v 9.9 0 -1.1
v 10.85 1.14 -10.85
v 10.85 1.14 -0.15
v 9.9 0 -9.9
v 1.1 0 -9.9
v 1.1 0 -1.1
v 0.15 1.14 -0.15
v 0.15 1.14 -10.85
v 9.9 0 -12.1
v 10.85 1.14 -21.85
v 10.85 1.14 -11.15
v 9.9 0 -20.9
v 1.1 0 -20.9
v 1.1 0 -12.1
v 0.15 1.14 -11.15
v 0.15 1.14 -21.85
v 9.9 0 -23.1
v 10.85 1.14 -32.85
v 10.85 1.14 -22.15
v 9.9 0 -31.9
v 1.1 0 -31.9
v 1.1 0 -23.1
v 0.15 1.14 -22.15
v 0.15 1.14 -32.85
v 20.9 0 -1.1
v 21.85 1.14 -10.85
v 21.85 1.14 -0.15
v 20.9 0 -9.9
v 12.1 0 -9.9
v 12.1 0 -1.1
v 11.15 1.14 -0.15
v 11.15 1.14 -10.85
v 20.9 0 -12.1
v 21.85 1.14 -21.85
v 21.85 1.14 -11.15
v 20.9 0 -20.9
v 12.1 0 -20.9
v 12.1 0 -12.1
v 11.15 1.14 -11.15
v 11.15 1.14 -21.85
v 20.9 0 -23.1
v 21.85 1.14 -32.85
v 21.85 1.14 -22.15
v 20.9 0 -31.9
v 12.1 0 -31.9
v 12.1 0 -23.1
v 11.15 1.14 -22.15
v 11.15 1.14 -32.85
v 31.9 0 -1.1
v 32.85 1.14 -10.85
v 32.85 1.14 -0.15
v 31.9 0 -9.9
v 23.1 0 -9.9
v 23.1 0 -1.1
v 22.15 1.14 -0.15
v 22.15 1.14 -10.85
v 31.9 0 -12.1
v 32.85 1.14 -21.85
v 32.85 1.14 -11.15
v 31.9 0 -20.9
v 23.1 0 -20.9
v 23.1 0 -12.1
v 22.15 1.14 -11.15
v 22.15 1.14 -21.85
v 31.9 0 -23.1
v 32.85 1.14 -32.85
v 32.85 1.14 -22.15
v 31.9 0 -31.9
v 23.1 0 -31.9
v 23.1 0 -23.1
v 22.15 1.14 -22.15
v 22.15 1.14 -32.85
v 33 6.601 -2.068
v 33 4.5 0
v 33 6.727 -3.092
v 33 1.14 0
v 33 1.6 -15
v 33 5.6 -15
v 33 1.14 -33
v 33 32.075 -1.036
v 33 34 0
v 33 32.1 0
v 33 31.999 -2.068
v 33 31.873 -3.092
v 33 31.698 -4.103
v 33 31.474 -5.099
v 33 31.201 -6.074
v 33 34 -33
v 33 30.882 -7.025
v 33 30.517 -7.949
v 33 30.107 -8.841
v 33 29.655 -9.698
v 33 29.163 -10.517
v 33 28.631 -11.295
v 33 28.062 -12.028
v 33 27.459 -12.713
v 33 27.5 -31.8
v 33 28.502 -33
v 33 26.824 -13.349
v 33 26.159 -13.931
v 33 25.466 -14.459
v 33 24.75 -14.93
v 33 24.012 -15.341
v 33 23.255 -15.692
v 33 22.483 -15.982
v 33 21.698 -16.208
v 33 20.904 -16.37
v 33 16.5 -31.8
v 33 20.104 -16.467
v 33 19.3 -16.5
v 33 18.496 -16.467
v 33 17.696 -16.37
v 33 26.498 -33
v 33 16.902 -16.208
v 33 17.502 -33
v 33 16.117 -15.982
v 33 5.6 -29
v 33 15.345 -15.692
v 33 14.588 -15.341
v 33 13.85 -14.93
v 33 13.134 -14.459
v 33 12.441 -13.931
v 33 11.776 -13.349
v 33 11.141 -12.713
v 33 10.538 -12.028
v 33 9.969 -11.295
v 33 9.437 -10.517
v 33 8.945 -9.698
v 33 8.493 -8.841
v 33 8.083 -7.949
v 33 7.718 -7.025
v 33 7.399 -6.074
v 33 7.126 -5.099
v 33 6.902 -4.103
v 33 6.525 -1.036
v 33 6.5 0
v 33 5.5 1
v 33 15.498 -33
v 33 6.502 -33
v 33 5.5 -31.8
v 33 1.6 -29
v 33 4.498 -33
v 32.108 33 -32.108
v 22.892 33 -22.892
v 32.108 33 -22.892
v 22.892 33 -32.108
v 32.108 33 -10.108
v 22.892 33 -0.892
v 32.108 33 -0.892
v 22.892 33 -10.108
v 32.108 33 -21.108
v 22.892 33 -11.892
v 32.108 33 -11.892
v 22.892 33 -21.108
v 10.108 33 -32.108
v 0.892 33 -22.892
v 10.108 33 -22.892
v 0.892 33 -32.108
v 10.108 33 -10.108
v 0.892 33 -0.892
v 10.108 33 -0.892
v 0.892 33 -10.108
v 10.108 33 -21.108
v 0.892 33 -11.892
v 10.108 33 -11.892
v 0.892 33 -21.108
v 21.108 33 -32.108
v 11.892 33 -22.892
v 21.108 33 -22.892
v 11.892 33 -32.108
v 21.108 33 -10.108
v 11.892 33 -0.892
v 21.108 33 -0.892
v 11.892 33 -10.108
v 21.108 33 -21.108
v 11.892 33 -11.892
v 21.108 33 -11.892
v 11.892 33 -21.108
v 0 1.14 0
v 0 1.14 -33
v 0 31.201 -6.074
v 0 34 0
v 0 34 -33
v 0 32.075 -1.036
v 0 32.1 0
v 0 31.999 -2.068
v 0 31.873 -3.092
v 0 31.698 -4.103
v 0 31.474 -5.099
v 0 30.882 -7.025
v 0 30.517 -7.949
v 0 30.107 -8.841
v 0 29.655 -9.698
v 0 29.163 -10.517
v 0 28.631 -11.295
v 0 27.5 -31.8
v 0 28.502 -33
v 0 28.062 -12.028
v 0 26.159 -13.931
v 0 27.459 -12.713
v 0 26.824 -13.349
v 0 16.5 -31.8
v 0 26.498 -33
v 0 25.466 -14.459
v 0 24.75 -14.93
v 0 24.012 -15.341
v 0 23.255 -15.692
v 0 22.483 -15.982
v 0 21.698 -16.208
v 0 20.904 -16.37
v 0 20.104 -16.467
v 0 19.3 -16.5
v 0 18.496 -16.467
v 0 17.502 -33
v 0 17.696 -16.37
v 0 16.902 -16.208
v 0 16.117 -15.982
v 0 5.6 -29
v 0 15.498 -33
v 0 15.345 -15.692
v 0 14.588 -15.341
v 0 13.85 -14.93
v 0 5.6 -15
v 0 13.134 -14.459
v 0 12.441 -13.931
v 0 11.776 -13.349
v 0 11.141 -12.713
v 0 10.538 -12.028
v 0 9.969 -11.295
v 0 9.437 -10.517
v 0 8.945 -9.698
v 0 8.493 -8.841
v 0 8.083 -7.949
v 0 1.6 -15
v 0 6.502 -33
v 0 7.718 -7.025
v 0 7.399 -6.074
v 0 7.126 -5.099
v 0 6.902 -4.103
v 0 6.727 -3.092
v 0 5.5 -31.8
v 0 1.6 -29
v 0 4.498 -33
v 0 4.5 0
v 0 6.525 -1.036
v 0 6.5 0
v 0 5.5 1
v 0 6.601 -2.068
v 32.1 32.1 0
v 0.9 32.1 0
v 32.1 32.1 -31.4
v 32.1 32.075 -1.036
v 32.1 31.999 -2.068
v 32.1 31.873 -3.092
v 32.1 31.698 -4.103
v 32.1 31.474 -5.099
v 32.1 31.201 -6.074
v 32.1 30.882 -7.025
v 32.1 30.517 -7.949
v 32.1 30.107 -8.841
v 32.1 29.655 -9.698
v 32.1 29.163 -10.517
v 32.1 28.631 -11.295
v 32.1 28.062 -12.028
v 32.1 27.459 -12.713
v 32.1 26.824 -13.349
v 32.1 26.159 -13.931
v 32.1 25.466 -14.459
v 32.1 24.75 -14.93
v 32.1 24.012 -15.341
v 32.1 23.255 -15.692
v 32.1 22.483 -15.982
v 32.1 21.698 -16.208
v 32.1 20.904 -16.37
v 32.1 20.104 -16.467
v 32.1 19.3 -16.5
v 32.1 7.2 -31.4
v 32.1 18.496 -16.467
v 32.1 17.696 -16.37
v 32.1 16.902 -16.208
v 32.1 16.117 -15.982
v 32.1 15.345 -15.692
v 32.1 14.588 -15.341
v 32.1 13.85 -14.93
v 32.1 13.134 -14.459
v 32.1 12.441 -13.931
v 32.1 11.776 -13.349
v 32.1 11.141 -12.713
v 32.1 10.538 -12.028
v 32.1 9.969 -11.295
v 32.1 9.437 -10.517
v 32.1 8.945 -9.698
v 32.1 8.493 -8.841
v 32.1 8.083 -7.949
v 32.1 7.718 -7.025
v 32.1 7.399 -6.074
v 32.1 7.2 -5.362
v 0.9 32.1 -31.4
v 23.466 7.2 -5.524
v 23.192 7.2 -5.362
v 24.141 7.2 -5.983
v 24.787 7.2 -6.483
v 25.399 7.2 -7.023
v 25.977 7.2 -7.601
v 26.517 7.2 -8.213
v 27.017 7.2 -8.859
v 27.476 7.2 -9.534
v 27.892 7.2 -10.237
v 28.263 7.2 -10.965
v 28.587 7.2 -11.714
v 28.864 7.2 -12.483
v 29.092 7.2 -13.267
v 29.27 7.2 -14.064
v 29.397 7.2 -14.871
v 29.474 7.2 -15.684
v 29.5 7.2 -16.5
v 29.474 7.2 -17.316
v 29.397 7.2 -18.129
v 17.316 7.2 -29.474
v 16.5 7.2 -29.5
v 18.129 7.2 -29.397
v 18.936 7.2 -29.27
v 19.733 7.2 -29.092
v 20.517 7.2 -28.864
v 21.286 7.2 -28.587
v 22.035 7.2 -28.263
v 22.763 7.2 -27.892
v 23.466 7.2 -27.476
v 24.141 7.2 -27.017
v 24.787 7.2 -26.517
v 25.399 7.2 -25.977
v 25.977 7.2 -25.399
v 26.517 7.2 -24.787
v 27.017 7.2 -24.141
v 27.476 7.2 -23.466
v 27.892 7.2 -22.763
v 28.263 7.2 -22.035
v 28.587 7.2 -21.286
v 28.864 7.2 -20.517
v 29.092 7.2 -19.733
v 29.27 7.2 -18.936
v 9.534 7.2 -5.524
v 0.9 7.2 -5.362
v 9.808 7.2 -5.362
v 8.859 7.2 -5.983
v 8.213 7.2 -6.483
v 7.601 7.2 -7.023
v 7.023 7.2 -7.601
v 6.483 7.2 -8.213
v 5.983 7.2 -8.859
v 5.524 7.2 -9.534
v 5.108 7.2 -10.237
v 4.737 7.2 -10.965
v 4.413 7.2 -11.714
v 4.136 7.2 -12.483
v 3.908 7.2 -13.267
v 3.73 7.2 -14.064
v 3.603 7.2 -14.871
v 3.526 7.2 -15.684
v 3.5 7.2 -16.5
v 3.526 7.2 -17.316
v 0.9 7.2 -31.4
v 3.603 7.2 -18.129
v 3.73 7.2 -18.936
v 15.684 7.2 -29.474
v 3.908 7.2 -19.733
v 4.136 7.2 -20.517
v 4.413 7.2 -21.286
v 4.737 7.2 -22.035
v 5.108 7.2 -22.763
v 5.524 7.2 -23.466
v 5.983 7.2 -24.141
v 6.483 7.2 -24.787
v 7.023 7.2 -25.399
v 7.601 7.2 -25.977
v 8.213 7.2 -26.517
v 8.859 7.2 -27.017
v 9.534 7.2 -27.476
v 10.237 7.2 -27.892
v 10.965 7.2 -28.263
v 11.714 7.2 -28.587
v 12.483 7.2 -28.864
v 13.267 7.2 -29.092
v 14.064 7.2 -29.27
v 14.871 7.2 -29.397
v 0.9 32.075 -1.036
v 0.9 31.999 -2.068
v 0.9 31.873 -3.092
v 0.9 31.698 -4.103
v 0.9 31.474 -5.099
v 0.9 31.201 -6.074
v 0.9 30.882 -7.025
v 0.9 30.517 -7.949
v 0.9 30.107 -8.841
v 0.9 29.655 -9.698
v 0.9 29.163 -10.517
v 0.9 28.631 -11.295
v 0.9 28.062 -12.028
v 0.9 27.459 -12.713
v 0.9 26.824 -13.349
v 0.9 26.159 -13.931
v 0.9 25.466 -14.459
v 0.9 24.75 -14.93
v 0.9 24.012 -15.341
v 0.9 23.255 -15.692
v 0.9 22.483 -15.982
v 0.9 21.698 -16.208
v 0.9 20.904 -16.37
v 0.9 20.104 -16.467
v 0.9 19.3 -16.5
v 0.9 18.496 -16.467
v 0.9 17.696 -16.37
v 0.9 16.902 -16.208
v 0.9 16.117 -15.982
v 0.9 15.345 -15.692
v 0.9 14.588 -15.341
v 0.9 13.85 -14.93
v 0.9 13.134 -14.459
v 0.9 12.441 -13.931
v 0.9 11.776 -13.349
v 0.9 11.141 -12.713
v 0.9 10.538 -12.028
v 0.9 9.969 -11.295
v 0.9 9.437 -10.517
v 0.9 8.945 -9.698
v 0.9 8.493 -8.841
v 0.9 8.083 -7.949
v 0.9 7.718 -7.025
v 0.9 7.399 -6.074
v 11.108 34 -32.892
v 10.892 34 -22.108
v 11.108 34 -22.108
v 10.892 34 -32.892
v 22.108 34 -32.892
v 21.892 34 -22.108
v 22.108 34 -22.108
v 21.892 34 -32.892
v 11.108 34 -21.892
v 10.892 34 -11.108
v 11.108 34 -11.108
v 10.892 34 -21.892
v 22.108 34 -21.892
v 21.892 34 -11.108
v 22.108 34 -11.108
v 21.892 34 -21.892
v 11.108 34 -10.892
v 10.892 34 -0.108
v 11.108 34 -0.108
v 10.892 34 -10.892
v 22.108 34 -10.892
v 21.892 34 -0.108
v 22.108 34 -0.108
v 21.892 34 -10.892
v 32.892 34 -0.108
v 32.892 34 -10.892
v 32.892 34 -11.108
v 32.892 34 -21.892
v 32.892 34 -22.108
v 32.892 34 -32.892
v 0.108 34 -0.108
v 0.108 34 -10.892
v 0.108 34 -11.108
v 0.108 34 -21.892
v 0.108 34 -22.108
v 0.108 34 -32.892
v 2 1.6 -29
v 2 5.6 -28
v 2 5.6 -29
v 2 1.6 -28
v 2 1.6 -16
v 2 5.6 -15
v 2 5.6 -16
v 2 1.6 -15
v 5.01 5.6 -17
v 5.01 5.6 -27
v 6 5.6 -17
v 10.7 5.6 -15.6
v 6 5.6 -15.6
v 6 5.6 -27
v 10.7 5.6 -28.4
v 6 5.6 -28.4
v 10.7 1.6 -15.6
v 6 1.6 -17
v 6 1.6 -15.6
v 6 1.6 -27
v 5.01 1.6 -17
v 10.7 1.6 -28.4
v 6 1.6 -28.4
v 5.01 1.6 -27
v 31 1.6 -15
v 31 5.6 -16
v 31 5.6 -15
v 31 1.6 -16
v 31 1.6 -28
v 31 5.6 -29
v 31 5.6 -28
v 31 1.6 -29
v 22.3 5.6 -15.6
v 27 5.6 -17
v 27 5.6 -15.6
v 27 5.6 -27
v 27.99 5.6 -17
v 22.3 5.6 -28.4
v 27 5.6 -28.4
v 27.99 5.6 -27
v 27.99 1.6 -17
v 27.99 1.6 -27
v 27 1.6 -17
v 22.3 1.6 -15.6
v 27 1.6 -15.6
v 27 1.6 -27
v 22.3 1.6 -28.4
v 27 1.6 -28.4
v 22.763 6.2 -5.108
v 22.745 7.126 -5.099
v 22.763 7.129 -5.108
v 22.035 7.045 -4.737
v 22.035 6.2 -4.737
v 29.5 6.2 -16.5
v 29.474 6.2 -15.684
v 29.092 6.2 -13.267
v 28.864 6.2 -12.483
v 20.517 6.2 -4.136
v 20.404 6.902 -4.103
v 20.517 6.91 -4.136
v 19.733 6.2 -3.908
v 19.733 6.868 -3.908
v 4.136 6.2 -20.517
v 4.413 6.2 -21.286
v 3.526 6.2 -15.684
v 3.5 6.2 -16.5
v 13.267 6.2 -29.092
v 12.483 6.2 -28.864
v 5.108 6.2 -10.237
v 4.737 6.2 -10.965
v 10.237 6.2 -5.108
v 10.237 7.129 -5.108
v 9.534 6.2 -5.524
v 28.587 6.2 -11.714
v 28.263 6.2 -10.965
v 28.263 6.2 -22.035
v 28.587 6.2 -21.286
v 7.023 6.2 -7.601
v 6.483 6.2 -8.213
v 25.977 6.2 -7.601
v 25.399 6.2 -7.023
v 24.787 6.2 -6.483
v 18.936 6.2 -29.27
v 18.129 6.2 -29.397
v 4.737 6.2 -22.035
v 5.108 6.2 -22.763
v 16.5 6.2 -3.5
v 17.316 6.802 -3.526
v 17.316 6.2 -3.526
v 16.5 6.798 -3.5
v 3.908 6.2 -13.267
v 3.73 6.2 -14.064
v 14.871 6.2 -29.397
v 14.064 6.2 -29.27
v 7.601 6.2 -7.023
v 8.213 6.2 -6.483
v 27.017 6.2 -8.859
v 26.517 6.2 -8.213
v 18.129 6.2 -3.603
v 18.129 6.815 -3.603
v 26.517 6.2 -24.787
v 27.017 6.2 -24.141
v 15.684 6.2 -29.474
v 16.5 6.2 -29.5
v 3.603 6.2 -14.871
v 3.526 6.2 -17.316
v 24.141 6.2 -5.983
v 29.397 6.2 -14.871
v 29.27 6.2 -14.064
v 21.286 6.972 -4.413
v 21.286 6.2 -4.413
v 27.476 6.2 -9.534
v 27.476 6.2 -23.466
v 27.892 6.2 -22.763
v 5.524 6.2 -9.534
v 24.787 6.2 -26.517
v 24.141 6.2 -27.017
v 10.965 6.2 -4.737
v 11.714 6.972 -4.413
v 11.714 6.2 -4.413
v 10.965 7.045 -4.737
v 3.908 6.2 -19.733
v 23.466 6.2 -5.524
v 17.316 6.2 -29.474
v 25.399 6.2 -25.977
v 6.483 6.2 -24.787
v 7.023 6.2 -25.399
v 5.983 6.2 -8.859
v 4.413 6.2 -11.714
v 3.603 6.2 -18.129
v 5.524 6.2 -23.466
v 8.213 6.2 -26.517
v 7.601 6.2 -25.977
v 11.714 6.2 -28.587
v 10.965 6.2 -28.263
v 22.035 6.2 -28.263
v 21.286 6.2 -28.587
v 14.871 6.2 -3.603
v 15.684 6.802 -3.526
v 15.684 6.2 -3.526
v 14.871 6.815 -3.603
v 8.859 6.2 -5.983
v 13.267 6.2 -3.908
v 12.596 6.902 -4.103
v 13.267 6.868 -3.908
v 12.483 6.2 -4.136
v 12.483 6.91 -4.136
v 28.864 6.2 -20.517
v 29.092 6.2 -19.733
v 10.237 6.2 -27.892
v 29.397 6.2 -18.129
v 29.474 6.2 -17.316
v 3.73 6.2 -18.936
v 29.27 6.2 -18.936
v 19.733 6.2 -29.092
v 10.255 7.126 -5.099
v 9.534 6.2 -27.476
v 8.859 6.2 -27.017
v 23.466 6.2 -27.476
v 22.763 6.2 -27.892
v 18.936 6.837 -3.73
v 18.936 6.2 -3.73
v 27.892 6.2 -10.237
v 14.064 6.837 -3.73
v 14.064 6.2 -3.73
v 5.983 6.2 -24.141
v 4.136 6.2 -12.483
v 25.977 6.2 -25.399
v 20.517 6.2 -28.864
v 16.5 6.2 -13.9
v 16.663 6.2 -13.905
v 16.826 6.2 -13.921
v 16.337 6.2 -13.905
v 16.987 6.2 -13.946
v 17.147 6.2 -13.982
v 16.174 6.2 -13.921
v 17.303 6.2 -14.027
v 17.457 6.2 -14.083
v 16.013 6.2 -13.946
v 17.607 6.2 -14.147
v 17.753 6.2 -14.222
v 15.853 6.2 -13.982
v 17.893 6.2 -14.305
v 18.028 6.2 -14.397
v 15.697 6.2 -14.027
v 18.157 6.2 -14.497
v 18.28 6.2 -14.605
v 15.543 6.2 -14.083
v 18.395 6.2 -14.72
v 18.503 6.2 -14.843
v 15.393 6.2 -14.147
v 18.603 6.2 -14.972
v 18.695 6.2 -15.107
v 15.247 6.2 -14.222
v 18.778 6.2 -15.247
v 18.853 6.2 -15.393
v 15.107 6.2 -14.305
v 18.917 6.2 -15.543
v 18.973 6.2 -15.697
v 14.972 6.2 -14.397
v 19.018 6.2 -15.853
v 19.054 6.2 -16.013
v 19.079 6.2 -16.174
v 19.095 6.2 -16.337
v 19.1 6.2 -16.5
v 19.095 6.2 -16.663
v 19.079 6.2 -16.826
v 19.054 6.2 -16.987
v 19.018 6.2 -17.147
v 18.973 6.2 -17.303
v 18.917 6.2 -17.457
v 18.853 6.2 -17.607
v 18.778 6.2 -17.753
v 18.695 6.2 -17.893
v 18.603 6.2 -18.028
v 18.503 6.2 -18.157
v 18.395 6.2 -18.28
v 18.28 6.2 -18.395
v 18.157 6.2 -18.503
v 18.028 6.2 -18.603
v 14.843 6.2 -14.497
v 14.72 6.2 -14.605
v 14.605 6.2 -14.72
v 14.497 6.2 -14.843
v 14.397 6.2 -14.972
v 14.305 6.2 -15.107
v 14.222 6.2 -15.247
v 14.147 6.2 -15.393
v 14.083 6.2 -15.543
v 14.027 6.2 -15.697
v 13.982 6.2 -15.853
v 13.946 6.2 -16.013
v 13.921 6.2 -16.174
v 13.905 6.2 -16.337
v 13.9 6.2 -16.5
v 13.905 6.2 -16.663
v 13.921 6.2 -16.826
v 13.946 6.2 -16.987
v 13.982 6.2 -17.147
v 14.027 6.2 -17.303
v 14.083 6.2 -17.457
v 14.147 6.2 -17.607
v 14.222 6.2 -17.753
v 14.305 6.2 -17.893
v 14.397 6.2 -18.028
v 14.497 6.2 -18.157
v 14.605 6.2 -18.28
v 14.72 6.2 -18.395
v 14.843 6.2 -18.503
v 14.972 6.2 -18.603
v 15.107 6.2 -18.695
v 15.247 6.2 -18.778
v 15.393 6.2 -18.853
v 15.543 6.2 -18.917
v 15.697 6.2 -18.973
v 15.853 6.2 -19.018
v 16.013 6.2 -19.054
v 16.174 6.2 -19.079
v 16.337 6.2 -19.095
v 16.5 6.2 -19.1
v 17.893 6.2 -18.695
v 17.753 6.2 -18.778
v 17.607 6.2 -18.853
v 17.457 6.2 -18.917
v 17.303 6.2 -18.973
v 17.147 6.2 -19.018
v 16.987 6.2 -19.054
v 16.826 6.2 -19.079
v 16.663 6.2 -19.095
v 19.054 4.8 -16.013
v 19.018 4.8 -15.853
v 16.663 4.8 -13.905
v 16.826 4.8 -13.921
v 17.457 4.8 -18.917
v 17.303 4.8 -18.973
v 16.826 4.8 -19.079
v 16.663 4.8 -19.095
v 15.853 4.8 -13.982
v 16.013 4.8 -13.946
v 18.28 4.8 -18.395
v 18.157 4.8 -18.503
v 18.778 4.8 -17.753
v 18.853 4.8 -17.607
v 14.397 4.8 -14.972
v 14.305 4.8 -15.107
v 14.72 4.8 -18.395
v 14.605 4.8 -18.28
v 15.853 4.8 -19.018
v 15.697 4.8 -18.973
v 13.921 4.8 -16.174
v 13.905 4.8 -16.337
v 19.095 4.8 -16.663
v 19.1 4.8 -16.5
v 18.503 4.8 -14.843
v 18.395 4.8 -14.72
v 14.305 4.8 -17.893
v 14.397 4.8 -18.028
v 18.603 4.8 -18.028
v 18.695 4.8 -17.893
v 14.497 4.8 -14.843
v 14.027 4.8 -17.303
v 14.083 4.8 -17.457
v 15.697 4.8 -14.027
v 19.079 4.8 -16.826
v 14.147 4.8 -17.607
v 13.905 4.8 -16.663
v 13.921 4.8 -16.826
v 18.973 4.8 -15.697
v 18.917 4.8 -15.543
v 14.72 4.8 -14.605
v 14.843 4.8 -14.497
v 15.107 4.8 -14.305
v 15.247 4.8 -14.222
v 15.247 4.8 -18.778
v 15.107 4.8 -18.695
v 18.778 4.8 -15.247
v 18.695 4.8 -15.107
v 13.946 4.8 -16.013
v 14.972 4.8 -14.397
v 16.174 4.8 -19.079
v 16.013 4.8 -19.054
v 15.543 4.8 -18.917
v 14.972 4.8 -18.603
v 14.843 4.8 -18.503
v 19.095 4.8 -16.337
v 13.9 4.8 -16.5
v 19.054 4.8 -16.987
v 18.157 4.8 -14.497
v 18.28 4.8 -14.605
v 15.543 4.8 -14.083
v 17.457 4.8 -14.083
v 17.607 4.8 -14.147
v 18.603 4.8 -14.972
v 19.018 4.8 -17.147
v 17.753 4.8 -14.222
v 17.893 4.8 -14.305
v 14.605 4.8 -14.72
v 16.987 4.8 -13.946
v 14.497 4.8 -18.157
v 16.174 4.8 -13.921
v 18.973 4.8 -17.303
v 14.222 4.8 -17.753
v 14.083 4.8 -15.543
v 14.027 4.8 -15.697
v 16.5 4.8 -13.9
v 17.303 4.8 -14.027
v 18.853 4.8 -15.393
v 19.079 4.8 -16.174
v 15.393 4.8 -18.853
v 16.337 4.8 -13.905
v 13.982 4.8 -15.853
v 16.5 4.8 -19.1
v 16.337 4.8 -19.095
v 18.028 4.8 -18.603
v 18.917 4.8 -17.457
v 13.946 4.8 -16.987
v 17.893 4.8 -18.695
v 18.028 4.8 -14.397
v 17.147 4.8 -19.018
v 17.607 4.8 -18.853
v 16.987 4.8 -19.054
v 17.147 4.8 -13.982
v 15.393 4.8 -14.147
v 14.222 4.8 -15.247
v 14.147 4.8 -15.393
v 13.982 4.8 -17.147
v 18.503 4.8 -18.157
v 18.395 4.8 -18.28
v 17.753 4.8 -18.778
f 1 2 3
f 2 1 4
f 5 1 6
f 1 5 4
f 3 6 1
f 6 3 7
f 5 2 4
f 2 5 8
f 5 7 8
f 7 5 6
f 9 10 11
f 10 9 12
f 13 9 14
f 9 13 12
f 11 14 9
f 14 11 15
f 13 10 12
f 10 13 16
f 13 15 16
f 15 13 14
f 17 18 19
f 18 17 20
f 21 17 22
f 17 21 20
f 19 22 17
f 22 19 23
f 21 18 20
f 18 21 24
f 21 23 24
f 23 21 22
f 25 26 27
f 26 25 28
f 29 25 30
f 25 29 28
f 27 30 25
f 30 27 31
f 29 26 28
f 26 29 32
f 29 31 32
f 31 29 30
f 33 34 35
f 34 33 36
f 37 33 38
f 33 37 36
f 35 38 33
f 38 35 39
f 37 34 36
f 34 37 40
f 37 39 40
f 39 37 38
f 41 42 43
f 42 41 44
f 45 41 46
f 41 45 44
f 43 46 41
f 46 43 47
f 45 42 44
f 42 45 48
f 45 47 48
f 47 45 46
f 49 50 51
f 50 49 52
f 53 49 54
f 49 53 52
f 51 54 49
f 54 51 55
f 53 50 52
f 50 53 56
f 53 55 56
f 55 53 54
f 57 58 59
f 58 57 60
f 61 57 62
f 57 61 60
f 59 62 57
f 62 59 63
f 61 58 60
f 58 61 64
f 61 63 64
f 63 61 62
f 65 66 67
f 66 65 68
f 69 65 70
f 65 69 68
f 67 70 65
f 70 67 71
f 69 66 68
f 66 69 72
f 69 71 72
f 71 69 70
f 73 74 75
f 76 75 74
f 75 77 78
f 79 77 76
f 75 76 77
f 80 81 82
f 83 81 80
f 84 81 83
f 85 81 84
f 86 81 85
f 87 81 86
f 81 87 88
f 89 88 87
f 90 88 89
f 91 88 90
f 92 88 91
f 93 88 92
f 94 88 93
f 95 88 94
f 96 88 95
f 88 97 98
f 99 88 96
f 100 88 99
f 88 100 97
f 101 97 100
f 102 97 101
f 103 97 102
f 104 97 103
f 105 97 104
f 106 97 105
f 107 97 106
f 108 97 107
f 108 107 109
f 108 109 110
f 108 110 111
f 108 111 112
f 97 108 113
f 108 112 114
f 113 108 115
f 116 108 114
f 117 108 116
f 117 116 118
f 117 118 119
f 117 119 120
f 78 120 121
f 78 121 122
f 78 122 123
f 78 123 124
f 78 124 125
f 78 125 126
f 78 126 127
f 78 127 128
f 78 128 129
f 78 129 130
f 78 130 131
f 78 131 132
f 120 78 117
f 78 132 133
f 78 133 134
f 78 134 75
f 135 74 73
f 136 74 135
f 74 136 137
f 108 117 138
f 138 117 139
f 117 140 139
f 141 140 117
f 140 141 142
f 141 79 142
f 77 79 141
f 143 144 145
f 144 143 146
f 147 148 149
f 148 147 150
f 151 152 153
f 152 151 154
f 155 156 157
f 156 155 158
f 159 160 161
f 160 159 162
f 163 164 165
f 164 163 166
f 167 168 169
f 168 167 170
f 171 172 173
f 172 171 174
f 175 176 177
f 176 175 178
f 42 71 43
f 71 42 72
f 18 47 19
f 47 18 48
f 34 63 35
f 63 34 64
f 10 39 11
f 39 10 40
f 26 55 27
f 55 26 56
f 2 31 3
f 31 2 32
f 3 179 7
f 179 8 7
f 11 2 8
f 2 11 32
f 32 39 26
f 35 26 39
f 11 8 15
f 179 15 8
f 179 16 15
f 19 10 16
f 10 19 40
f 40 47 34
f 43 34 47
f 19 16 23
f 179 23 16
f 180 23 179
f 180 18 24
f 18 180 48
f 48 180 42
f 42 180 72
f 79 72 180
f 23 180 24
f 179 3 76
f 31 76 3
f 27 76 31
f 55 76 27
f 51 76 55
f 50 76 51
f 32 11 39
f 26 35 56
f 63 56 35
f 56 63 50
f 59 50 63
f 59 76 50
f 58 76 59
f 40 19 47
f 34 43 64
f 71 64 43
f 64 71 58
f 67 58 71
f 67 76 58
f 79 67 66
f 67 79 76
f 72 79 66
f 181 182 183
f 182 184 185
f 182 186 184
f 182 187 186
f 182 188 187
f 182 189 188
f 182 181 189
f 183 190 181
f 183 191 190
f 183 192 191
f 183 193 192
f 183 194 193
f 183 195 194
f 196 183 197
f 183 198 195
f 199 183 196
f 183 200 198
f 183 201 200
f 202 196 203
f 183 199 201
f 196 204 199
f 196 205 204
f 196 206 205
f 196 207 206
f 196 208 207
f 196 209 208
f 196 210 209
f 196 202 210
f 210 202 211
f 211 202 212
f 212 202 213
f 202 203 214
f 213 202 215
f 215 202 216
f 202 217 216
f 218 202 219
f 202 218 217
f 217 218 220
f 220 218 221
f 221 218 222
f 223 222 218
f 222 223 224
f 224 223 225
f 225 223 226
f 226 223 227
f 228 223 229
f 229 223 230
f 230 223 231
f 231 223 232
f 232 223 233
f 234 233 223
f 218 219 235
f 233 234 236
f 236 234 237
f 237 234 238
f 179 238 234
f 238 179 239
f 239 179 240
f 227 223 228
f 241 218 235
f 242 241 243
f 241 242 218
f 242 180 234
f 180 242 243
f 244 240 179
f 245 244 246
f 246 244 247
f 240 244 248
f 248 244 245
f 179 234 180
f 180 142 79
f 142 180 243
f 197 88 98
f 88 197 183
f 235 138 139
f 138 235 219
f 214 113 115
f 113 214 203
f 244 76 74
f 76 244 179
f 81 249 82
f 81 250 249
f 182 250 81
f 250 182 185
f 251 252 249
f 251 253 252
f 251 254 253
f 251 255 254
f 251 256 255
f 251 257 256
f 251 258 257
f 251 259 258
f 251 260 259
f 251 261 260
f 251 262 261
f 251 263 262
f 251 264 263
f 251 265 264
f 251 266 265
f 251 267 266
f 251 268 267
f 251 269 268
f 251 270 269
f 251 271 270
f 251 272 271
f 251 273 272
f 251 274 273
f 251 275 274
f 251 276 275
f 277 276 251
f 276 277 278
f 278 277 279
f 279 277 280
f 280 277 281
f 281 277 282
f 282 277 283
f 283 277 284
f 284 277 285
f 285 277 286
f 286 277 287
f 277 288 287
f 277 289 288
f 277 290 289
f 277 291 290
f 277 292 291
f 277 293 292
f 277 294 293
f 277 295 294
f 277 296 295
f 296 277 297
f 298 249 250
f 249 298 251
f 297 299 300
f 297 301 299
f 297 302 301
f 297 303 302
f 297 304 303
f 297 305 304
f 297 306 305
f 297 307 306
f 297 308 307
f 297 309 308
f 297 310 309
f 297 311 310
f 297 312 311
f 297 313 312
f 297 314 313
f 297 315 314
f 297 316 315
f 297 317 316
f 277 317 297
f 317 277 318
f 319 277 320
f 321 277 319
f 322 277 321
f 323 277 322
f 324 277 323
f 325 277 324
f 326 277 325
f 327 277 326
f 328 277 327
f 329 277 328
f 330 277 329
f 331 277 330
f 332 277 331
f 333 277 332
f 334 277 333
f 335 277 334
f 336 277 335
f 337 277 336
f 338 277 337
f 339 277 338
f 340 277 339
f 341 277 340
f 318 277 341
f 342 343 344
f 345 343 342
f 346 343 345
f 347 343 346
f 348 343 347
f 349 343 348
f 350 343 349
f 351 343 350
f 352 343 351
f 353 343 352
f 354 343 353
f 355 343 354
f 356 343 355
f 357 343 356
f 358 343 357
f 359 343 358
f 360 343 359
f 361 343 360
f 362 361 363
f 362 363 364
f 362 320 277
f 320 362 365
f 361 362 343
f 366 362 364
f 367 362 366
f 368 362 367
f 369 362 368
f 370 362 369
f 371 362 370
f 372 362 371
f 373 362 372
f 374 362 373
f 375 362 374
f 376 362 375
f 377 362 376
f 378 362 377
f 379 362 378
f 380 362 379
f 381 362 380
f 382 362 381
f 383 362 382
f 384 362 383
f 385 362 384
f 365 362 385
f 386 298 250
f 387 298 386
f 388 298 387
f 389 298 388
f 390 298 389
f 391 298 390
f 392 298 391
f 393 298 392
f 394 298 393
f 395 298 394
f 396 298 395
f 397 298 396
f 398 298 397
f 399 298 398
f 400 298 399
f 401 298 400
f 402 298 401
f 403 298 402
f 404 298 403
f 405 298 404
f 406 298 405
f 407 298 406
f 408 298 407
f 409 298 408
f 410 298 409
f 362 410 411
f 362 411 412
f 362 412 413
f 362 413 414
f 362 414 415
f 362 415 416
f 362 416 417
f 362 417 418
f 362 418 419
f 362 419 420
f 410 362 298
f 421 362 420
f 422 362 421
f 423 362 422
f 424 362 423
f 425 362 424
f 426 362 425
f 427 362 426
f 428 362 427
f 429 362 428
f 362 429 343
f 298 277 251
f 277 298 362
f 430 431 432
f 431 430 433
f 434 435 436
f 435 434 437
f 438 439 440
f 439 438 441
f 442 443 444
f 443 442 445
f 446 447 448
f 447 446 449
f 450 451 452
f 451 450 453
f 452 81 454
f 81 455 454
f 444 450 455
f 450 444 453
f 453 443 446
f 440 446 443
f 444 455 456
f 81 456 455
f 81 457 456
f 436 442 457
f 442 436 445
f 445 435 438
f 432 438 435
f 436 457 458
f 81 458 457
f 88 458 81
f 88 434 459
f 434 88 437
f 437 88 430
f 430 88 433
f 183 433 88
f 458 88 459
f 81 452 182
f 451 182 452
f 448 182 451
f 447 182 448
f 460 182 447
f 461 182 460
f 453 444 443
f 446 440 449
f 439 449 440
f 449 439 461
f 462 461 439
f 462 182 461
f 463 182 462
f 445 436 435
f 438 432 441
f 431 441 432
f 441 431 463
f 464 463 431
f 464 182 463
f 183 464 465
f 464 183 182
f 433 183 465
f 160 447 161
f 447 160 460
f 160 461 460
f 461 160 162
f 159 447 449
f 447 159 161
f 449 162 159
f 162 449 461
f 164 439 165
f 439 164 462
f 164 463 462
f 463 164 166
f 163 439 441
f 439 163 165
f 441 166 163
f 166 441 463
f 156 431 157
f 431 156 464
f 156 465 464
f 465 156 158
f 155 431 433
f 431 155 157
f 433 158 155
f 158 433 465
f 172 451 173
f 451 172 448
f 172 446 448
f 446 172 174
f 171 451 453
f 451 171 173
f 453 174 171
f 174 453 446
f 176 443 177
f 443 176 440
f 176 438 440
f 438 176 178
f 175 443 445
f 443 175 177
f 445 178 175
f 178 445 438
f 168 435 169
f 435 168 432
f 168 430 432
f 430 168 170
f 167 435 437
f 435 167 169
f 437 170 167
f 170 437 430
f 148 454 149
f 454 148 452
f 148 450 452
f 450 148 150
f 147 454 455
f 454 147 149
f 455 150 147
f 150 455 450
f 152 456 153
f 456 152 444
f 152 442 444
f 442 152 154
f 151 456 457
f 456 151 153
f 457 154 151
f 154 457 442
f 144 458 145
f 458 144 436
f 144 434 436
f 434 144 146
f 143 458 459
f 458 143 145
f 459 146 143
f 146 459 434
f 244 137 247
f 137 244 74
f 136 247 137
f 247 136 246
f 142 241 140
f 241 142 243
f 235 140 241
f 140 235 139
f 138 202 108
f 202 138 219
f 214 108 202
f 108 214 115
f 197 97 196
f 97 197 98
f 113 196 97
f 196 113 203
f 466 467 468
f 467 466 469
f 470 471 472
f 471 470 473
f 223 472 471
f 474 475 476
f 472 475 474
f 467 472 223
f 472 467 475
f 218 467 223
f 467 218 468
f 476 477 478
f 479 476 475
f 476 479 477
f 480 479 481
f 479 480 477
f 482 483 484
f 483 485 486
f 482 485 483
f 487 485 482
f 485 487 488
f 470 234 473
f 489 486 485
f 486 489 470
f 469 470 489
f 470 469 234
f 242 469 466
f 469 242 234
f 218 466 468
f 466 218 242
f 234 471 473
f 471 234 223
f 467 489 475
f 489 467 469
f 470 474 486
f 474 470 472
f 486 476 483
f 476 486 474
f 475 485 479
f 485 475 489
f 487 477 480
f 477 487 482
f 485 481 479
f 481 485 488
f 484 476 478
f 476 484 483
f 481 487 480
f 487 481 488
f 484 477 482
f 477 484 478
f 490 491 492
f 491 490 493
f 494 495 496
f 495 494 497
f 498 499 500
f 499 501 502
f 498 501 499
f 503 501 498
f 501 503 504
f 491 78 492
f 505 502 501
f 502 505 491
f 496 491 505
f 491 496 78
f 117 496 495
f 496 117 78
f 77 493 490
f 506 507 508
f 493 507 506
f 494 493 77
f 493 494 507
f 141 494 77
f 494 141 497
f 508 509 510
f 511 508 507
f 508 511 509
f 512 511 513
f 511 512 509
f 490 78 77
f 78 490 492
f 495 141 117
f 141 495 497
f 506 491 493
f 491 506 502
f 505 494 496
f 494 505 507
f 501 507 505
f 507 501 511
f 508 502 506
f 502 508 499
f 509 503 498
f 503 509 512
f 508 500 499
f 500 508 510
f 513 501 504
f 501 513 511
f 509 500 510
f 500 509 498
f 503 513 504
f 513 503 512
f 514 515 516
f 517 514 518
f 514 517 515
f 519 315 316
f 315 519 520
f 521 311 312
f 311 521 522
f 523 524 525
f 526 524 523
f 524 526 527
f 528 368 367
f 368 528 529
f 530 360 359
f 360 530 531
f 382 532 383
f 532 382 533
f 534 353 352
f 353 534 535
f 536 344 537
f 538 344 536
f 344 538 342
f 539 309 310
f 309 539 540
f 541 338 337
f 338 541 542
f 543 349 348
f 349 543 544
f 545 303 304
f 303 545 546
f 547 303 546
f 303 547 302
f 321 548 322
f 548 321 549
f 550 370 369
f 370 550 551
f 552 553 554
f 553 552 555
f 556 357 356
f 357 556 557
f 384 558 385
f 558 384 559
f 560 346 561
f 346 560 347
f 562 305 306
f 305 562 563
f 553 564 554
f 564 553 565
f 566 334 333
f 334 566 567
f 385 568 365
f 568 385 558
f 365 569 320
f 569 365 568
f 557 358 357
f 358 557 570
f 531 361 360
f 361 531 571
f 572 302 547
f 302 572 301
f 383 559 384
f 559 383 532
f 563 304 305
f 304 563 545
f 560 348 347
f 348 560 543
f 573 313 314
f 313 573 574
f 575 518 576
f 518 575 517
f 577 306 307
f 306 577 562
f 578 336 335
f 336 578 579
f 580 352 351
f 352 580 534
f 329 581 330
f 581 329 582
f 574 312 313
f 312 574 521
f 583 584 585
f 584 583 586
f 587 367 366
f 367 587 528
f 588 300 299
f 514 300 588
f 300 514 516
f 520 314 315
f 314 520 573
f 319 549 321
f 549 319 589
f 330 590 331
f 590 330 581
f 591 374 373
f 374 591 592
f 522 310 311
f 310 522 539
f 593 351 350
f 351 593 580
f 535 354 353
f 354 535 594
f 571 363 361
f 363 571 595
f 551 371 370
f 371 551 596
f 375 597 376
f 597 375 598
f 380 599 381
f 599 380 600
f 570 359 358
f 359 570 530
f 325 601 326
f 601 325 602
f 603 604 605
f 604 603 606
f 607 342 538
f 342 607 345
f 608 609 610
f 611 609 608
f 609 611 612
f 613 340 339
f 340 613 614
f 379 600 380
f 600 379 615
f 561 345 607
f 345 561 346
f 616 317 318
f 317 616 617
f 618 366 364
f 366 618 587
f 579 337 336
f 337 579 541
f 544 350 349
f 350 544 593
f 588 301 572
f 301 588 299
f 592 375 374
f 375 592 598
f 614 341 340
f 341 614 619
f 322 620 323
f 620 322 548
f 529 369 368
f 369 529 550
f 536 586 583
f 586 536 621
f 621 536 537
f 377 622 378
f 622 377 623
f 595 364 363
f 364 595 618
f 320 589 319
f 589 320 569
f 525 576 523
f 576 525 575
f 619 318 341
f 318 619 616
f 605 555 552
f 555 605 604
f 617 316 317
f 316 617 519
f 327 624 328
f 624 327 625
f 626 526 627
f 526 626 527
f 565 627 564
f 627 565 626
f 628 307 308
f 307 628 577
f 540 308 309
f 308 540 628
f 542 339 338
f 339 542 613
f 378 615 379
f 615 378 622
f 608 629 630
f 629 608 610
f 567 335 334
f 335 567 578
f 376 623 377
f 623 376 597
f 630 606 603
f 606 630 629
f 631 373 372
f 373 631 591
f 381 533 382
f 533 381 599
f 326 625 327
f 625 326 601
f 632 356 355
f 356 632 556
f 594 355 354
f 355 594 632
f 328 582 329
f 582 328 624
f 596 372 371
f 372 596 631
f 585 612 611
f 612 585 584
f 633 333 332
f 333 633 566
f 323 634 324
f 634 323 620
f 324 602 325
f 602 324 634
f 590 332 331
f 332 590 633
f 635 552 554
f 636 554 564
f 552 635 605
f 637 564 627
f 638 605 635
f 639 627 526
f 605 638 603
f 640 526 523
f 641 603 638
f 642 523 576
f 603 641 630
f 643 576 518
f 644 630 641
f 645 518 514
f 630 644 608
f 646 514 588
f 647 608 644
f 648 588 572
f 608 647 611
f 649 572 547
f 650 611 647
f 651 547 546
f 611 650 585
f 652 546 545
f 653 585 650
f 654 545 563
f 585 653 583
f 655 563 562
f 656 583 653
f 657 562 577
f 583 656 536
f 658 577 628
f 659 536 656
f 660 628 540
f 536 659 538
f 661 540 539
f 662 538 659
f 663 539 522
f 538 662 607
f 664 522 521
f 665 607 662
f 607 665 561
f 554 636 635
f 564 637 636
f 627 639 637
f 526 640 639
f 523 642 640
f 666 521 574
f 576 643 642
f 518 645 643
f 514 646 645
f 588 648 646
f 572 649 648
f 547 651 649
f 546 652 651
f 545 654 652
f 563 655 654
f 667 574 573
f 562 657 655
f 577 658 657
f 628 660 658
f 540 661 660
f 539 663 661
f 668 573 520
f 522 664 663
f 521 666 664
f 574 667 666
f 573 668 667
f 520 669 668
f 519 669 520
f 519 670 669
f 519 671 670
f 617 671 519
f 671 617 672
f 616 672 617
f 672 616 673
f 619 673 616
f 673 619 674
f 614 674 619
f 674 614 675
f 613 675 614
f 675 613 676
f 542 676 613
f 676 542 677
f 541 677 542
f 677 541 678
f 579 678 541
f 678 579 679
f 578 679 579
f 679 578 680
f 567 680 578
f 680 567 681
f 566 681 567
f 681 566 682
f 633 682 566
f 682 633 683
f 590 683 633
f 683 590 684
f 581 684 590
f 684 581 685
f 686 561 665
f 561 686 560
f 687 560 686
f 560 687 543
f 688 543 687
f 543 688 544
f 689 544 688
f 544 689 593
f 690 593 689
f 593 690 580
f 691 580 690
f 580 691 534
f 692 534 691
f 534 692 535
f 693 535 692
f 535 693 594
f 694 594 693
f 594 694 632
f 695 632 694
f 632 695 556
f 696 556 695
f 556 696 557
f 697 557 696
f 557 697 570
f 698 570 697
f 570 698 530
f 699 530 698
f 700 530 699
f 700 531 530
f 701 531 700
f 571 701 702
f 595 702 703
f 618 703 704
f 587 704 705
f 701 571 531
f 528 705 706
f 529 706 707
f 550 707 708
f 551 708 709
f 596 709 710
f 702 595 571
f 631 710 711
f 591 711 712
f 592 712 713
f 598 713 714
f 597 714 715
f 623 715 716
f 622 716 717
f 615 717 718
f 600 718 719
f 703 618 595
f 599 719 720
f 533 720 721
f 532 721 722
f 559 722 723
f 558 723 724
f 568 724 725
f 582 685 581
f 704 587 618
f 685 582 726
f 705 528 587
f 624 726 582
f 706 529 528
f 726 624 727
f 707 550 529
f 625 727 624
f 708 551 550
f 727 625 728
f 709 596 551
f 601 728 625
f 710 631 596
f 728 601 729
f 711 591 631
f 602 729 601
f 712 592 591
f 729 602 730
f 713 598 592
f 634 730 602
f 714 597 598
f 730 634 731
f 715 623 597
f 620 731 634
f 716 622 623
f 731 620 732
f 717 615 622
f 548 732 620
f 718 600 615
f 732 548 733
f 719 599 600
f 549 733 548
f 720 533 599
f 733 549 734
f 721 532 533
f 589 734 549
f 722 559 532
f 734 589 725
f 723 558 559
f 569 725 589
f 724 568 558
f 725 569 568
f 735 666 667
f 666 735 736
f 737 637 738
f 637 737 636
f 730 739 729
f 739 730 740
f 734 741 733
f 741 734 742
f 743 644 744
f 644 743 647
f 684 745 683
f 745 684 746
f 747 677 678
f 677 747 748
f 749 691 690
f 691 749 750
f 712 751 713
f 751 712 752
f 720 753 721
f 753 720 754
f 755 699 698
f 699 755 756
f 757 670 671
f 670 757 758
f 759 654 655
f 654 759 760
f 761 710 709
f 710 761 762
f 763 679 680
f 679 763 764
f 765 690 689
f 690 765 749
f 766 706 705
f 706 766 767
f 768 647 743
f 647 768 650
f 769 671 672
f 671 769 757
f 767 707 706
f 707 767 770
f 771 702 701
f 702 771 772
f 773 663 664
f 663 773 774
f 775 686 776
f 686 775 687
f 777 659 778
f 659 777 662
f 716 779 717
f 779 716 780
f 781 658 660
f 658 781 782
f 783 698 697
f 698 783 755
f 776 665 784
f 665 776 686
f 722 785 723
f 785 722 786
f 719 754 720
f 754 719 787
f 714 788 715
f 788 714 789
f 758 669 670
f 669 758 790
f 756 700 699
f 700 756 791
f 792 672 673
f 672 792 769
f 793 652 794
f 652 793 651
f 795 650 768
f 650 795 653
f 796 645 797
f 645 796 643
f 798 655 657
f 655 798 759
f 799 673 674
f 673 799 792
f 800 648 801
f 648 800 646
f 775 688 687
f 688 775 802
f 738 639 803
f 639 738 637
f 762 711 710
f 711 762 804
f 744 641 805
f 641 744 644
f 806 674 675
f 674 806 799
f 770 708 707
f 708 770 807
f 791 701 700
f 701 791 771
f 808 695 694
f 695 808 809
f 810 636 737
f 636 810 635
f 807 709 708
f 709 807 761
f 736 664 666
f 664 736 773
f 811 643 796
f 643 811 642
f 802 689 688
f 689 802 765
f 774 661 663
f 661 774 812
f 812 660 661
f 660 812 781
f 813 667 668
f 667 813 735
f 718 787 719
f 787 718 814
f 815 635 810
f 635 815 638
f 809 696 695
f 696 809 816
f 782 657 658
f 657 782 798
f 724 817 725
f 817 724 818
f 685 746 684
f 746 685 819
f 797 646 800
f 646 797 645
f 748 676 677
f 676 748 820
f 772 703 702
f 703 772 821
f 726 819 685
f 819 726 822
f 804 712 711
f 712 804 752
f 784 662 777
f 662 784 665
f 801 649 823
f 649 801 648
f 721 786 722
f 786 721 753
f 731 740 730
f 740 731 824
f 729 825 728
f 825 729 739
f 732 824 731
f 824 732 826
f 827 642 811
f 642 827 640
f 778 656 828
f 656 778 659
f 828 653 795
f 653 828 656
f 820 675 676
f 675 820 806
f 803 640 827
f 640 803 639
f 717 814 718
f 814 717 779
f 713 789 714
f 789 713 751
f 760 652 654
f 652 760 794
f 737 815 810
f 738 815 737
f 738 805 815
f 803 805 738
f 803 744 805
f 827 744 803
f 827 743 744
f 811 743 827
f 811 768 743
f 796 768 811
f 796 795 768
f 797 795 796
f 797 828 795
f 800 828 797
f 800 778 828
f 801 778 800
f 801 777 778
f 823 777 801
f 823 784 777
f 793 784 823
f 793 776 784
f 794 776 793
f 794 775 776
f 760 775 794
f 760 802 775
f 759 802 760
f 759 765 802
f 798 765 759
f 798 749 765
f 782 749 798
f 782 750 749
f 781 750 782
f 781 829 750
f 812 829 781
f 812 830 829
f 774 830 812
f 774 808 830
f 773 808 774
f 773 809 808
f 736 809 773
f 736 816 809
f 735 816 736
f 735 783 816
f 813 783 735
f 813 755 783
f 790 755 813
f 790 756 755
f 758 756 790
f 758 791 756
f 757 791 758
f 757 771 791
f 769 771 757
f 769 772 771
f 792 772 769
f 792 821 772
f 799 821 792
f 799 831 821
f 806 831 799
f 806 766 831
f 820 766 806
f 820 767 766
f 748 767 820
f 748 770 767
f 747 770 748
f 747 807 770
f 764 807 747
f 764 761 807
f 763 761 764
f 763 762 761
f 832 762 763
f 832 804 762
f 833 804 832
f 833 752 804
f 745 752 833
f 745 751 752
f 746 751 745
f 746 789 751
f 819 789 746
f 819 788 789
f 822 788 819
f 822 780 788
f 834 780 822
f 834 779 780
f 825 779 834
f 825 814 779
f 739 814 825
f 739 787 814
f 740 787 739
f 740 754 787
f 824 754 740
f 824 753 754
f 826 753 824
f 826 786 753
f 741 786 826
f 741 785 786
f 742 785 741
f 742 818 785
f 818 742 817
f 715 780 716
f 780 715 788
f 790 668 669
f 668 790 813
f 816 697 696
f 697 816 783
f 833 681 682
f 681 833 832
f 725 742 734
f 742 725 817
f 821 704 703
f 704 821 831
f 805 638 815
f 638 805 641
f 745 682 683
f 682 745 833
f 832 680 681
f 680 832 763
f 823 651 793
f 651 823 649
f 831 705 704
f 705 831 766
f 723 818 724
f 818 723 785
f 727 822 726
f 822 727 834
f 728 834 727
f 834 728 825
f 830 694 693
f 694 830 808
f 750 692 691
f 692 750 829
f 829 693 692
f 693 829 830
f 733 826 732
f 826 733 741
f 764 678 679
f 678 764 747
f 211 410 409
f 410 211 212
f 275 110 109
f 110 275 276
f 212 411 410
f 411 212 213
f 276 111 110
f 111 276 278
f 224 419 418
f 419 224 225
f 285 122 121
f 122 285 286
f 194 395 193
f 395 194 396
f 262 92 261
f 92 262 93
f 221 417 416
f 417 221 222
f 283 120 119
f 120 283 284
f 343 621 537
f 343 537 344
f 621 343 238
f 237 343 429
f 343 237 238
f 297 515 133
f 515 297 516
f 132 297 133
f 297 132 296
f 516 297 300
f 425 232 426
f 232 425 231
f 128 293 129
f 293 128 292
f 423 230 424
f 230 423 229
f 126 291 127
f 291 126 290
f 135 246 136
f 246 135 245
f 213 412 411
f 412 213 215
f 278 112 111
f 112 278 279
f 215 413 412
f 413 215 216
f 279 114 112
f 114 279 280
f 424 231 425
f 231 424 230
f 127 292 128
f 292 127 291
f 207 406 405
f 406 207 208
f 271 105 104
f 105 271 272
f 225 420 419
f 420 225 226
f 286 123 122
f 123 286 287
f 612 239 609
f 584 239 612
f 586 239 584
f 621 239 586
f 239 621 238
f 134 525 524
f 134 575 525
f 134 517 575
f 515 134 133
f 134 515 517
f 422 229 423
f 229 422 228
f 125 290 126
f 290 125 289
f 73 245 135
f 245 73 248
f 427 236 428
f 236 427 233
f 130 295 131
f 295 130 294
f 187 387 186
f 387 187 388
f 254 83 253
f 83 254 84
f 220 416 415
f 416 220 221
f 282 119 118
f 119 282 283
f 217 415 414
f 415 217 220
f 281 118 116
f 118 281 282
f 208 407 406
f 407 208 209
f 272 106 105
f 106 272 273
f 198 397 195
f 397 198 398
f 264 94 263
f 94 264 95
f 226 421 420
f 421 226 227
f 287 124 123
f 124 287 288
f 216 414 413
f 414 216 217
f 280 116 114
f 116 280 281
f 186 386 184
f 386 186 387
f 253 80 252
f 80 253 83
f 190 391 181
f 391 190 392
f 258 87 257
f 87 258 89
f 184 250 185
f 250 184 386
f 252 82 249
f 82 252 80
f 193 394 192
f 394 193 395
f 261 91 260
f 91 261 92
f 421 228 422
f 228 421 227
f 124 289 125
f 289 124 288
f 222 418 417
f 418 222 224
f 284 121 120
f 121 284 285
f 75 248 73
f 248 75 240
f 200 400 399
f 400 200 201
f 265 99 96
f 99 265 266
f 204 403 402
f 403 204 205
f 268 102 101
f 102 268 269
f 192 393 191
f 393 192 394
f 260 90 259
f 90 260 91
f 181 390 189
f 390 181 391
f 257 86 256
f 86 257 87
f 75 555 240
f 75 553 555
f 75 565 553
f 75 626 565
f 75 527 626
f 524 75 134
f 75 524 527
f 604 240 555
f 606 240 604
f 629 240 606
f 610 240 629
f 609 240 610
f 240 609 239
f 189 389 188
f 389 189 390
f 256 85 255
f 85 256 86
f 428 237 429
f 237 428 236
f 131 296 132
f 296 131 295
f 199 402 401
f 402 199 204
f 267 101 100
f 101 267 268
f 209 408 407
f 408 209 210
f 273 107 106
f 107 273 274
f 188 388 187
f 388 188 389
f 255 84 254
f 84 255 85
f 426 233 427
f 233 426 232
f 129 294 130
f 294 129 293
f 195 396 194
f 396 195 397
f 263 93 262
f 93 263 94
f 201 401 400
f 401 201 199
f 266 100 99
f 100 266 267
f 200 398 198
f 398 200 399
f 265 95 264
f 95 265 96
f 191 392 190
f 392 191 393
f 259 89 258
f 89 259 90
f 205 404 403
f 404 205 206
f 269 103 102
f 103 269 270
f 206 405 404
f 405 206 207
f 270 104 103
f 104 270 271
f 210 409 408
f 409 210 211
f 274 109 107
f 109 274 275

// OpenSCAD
/*
 * miniStorage v1.0
 */

/* [Number of minis] */
// How many minis shall be stored?
number_of_minis = 1; //[1:8]

/* [Mini Base Size] */
// Diameter of mini's base
mini_base_size = 25.25; //[16.37:small - 16.37 mm, 25.25:medium - 25.25 mm, 50.5:large - 50.5 mm, 75.75:huge - 75.75 mm, 101.0:gargantuan - 101 mm]

/* [Mini Size] */
// Width of mini, measured in mm
mini_x = 16.37; //[::float]
// Depth of mini, measured in mm
mini_y = 16.37;   //[::float]
// Height of mini, measured in mm
mini_z = 12.71;   //[::float]

/* [Minimum Size of the Box] */
// With of the box, measured in grid fields
box_w = 3; //[2:18]
// Depth of the box, measured in grid fields
box_d = 2; //[2:8]
// Height of the box, measured in grid fields
box_h = 3; //[2:12]

/* [Grid Size] */
// What is the size in mm of one square grid field? (11.0 mm recommended)
grid_size = 11;

/* [Magnet cut out] */
// 5.2 mm works fine for 5x1 cylindrical magnets
magnet_diameter = 5.2;
// 1.4 mm works fine for 5x1 cylindrical magnets
magnet_height = 1.4;

/* [Wall Dimensions] */
wall_side = 0.9;
wall_back = 1.6;
wall_top = 0.9;

/* [Padding] */
padding_x = 1;
padding_y = 1;
padding_z = 1;

x = max(ceil((max(mini_x,mini_base_size) * number_of_minis + 2*wall_side + padding_x) / grid_size), box_w);
y = max(ceil((max(mini_y,mini_base_size) + wall_back + padding_y) / grid_size), box_d);
z = max(ceil((mini_z + wall_top + 7.2 + padding_z) / grid_size), box_h);


/*
 * Openlock connection bay
 */
module openlock() {
    height = 4;
    zPos = 1.6;
    buffer=1;
    translate([-buffer,-7,zPos]) cube([2+buffer,7*2,height]);
    hull() {
        translate([0,-6,zPos]) cube([2,6*2,height]);
        translate([3+0.01,-5,zPos]) cube([2,5*2,height]);
    }
    hull() {
        translate([5,-5,zPos]) cube([1,5*2,height]);
        translate([6,-5,zPos]) cube([1,5*2,height]);
    }
    translate([6,-6.4,zPos]) cube([4.7,6.4*2,height]);
}


module bottom_square() {
    hull() {
        translate([0.1,0.1,1.2]) cube([grid_size-0.2,grid_size-0.2,0.01]);
        translate([1.1,1.1,0]) cube([grid_size-2.2,grid_size-2.2,0.01]);
    }
}

module bottom_squares() {
    for ( i = [0 : x-1] ) {
        for ( j = [0 : y-1] ) {
            translate([i*grid_size, j*grid_size, 0])
            bottom_square();
        }
    }
}

module top_square() {
    difference() {
        cube([grid_size, grid_size, 1]);
        hull() {
            translate([0.9,0.9,-0.01])
             cube([grid_size-1.8, grid_size-1.8, 0.01]);
            translate([0.1,0.1,1.01])
             cube([grid_size-0.2, grid_size-0.2, 0.01]);
        }
    }
}

module top_squares() {
    for ( i = [0 : x-1] ) {
        for ( j = [0 : y-1] ) {
            translate([i*grid_size, j*grid_size, z*grid_size])
            top_square();
        }
    }
}

module main_cube() {
    render_buffer = 0.06;
    difference() {
        translate([0,0,1.2-render_buffer])
         cube([x*grid_size,y*grid_size,z*grid_size-1.2+render_buffer]);
        translate([wall_side, -0.01, 7.2])
         cube([x*grid_size-2*wall_side, y*grid_size-wall_back+0.01,
               z*grid_size-7.2-wall_top]);
    }
}

module front_bar() {
    zPos = grid_size/2;
    translate([0,0,zPos])
    rotate([0,90,0])
    linear_extrude(height = x*grid_size)
    polygon(points=[[-1,0],[1,0],[0,-1]]);
}

module main_positive() {
    union() {
        bottom_squares();
        main_cube();
        front_bar();
        top_squares();
    }
}

module back_grooves() {
    for ( i = [0 : z-1] ) {
        translate([-0.01, y*grid_size, grid_size/2 + i*grid_size])
        rotate([0,90,0])
        linear_extrude(height = x*grid_size + 0.02)
        polygon(points=[[-1.01,0.01],[1.01,0.01],[0,-1.2]]);
    }
}

module round_sidewall_cuts() {
    zPos = (grid_size/2+1);
    h = z*grid_size - zPos - wall_top;
    translate([-0.01, 0, h/2 + zPos])
    rotate([0,90,0])
    linear_extrude(height = x*grid_size + 0.02)
    resize([h, y*grid_size]) circle(d=1,$fn=100);
}

module openlock_negatives() {
    
    for( i= [y-1 : -2 : 1]) {
        translate([0, i*grid_size, 0]) rotate([0,0,0]) openlock();
        translate([x*grid_size, i*grid_size, 0]) rotate([0,0,180]) openlock();
    }
    
}

module figure_base_cutout() {
    translate([0,0,6.2])
    linear_extrude(4)
     circle(d=mini_base_size + 0.75, $fn=100);
    translate([0,0,6.2 - magnet_height])
     linear_extrude(magnet_height + 0.01)
     circle(d=magnet_diameter, $fn=100);
}

module figure_base_cutouts() {
    buf = (grid_size*x - 2*wall_side - mini_base_size*number_of_minis) / (2*number_of_minis + 2);
    x0 = x*grid_size - 2*wall_side - 2*buf;
    y0 = y*grid_size;
    x1 = (x0/number_of_minis);
    for ( i = [0 : number_of_minis-1] ) {
        translate([wall_side + buf + x1/2 + i*x1, y0/2, 0])
        figure_base_cutout();
    }
}

module all() {
    difference() {
        main_positive();
        
        back_grooves();
        
        openlock_negatives();
        
        figure_base_cutouts();
        
        round_sidewall_cuts();
    }
    
    
}



//color("green")
rotate([-90,0,0])
all();

echo(
    str("Box size: ",
        x, " x ",
        y, " x ",
        z
));

echo(
    str("Box outside dimension: ",
        grid_size*x, " x ",
        grid_size*y, " x ",
        grid_size*z
));

echo(
    str("Max Miniature dimension: ",
        (grid_size*x - 2*wall_side) / number_of_minis, " x ",
        grid_size*y - wall_back, " x ",
        grid_size*z - wall_top - 7.2
));
//figure_base_cutout();
